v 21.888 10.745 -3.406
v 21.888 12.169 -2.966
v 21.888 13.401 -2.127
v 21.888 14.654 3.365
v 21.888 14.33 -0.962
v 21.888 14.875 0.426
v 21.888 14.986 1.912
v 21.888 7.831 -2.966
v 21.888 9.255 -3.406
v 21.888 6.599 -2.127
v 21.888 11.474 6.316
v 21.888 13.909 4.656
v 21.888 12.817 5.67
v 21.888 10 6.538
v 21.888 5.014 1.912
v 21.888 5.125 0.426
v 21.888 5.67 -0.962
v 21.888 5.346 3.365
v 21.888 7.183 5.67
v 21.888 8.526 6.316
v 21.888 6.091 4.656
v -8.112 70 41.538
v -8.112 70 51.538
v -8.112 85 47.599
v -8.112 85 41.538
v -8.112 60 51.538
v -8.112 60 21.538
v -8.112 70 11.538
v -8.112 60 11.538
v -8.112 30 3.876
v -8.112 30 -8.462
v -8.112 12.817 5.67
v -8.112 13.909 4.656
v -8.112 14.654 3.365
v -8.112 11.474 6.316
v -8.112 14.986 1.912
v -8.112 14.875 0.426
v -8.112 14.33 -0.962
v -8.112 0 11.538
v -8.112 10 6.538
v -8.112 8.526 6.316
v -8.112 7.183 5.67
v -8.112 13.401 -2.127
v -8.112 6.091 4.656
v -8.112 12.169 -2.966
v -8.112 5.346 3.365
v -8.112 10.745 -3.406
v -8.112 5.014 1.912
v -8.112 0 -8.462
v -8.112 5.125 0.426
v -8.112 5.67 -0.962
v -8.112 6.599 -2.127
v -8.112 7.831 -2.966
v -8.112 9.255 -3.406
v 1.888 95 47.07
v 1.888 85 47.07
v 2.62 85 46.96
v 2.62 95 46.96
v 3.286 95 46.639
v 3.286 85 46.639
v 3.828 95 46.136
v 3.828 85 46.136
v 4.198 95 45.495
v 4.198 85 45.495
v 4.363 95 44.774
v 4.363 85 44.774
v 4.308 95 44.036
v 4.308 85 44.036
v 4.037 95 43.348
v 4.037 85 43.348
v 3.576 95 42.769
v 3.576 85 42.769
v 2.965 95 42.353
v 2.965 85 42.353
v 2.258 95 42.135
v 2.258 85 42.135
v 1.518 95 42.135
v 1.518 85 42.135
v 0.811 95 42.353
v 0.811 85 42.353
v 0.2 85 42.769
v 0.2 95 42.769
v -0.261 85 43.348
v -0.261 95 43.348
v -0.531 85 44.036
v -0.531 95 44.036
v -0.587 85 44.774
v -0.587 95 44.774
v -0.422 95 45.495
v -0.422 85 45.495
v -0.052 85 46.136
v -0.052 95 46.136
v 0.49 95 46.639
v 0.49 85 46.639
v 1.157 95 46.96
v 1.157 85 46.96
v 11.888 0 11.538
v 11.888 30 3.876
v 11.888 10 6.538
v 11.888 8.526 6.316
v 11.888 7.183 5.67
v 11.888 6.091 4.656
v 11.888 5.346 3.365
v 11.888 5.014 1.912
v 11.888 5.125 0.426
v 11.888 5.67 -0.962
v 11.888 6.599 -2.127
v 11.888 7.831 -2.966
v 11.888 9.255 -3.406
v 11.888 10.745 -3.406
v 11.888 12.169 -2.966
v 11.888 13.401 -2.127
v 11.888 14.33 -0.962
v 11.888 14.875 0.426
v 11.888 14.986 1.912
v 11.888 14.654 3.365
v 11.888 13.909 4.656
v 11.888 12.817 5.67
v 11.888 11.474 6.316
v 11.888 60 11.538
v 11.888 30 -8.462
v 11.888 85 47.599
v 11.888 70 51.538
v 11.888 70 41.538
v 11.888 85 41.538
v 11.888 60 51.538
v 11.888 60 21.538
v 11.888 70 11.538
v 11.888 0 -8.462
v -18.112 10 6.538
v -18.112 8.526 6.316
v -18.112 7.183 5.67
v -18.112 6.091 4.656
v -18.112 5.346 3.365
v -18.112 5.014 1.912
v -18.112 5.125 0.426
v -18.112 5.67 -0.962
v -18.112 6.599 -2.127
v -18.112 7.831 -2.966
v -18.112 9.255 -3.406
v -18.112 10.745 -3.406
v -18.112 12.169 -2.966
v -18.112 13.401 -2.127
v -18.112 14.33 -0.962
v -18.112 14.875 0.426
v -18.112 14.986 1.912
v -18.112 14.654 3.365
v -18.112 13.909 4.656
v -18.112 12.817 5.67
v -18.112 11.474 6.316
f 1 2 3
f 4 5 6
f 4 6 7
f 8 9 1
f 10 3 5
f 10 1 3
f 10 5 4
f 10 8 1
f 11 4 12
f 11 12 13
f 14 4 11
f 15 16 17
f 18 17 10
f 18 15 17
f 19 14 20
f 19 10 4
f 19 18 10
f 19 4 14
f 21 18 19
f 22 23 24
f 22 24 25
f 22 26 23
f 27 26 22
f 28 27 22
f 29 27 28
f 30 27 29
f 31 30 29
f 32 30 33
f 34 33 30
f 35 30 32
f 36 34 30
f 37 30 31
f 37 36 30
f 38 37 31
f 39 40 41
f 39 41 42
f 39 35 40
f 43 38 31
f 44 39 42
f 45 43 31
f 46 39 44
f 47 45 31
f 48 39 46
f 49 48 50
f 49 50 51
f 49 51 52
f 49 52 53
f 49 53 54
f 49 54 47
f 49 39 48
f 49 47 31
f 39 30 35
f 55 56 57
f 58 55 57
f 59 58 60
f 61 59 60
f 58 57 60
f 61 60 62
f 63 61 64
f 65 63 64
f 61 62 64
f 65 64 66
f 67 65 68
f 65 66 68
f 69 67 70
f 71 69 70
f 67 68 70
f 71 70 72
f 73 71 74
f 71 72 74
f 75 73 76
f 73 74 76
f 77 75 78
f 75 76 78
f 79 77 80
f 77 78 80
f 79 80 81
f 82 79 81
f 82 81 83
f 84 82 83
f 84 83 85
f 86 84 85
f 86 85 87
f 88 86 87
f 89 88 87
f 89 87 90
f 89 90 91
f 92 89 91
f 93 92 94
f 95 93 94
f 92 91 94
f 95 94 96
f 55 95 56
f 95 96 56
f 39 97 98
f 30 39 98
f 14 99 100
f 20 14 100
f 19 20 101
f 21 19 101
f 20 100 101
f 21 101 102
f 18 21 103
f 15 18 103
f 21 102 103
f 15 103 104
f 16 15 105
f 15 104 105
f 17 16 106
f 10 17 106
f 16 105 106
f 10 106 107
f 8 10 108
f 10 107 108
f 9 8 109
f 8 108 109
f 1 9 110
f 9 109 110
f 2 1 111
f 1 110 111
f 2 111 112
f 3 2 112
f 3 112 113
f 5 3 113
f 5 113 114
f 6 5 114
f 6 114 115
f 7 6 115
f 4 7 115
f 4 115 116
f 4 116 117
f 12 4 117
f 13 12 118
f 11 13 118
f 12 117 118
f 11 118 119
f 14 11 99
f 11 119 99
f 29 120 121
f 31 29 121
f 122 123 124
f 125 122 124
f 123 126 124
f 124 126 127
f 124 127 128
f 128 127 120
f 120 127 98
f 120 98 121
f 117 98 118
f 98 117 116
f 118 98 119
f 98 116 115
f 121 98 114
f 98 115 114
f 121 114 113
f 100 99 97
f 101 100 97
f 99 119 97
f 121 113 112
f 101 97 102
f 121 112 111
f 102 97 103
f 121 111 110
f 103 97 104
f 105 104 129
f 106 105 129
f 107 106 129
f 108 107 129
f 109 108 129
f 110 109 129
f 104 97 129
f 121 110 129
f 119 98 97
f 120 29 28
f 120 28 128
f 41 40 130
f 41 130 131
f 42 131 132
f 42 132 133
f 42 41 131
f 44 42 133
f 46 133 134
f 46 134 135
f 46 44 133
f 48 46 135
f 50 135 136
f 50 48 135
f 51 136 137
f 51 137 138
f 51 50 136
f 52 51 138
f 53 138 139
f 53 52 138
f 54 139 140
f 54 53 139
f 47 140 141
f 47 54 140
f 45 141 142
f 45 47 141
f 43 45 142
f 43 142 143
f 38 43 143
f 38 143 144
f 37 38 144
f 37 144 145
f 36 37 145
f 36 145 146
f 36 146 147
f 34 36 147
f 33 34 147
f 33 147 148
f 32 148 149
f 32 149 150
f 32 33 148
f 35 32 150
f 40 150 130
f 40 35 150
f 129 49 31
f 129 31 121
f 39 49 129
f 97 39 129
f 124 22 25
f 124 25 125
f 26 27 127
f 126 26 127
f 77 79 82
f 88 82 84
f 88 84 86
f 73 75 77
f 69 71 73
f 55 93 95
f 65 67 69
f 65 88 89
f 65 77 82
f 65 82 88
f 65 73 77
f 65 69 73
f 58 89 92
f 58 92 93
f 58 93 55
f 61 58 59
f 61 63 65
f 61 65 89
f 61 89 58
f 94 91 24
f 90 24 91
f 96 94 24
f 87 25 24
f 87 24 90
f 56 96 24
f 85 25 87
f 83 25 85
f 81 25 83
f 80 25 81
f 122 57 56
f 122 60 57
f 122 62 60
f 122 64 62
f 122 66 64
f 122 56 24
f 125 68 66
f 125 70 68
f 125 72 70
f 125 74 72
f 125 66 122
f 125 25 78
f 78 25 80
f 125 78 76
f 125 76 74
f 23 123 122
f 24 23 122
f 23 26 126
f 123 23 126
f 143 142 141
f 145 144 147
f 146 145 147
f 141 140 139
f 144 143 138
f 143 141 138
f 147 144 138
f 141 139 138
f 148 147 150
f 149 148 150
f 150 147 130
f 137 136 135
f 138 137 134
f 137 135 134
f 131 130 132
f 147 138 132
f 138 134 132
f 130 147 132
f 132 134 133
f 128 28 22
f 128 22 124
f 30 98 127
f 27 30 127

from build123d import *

# Parameters (mm, degrees)
SKETCH1_W           = 20
SKETCH1_H           = 20
BOSS_EXTRUDE2_DEPTH = 30
SKETCH2_R           = 5
BOSS_EXTRUDE3_DEPTH = 10
CUT_EXTRUDE2_DEPTH  = 20
SKETCH5_W           = 20
SKETCH5_H           = 30
BOSS_EXTRUDE4_DEPTH = 30
CUT_EXTRUDE3_DEPTH  = 20
SKETCH7_W           = 20
SKETCH7_H           = 40
BOSS_EXTRUDE5_DEPTH = 10
SKETCH8_W           = 20
SKETCH8_H           = 10
BOSS_EXTRUDE6_DEPTH = 15
CUT_EXTRUDE4_DEPTH  = 20
SKETCH10_R          = 2.481643059
BOSS_EXTRUDE7_DEPTH = 10


with BuildPart() as part:
    # Sketch1 → Boss-Extrude2 (new body)
    with BuildSketch(Plane(origin=(0, 0, 0), x_dir=(1, 0, 0), z_dir=(0, 1, 0))):
        with Locations((1.888111888, -1.538461538)):
            Rectangle(SKETCH1_W, SKETCH1_H)
    extrude(amount=BOSS_EXTRUDE2_DEPTH)

    # Sketch2 → Boss-Extrude3 (add)
    with BuildSketch(Plane(origin=(11.888111888, 0, 0), x_dir=(0, 0, -1), z_dir=(1, 0, 0))):
        with Locations(Location((-1.538461538, 10, 0), (0, 0, 180))):
            Circle(SKETCH2_R)
    boss_extrude3 = extrude(amount=BOSS_EXTRUDE3_DEPTH)

    # Mirror1: Boss-Extrude3 across plane
    add(boss_extrude3.mirror(Plane(origin=(1.888111888, 0, 0), x_dir=(0, 0, 1), z_dir=(1, 0, 0))))

    # Sketch3 → Cut-Extrude2 (cut)
    with BuildSketch(Plane(origin=(11.888111888, 0, 0), x_dir=(0, 0, -1), z_dir=(1, 0, 0))):
        Polygon((-11.538461538, 0), (-3.87574726, 30), (-11.538461538, 30), align=None)
    extrude(amount=-CUT_EXTRUDE2_DEPTH, mode=Mode.SUBTRACT)

    # Sketch5 → Boss-Extrude4 (add)
    with BuildSketch(Plane(origin=(0, 30, 0), x_dir=(1, 0, 0), z_dir=(0, 1, 0))):
        with Locations((1.888111888, -6.538461538)):
            Rectangle(SKETCH5_W, SKETCH5_H)
    extrude(amount=BOSS_EXTRUDE4_DEPTH)

    # Sketch6 → Cut-Extrude3 (cut)
    with BuildSketch(Plane(origin=(11.888111888, 0, 0), x_dir=(0, 0, -1), z_dir=(1, 0, 0))):
        Polygon((-3.87574726, 30), (-21.538461538, 60), (-21.538461538, 30), align=None)
        Polygon((8.461538462, 30), (8.461538462, 60), (-11.538461538, 60), align=None)
    extrude(amount=-CUT_EXTRUDE3_DEPTH, mode=Mode.SUBTRACT)

    # Sketch7 → Boss-Extrude5 (add)
    with BuildSketch(Plane(origin=(0, 60, 0), x_dir=(1, 0, 0), z_dir=(0, 1, 0))):
        with Locations((1.888111888, -31.538461538)):
            Rectangle(SKETCH7_W, SKETCH7_H)
    extrude(amount=BOSS_EXTRUDE5_DEPTH)

    # Sketch8 → Boss-Extrude6 (add)
    with BuildSketch(Plane(origin=(0, 70, 0), x_dir=(1, 0, 0), z_dir=(0, 1, 0))):
        with Locations((1.888111888, -46.538461538)):
            Rectangle(SKETCH8_W, SKETCH8_H)
    extrude(amount=BOSS_EXTRUDE6_DEPTH)

    # Sketch9 → Cut-Extrude4 (cut)
    with BuildSketch(Plane(origin=(11.888111888, 0, 0), x_dir=(0, 0, -1), z_dir=(1, 0, 0))):
        Polygon((-51.538461538, 70), (-47.598538903, 85), (-51.538461538, 85), align=None)
    extrude(amount=-CUT_EXTRUDE4_DEPTH, mode=Mode.SUBTRACT)

    # Sketch10 → Boss-Extrude7 (add)
    with BuildSketch(Plane(origin=(0, 85, 0), x_dir=(1, 0, 0), z_dir=(0, 1, 0))):
        with Locations(Location((1.888111888, -44.588461538, 0), (0, 0, 270))):
            Circle(SKETCH10_R)
    extrude(amount=BOSS_EXTRUDE7_DEPTH)


solid = part.part
